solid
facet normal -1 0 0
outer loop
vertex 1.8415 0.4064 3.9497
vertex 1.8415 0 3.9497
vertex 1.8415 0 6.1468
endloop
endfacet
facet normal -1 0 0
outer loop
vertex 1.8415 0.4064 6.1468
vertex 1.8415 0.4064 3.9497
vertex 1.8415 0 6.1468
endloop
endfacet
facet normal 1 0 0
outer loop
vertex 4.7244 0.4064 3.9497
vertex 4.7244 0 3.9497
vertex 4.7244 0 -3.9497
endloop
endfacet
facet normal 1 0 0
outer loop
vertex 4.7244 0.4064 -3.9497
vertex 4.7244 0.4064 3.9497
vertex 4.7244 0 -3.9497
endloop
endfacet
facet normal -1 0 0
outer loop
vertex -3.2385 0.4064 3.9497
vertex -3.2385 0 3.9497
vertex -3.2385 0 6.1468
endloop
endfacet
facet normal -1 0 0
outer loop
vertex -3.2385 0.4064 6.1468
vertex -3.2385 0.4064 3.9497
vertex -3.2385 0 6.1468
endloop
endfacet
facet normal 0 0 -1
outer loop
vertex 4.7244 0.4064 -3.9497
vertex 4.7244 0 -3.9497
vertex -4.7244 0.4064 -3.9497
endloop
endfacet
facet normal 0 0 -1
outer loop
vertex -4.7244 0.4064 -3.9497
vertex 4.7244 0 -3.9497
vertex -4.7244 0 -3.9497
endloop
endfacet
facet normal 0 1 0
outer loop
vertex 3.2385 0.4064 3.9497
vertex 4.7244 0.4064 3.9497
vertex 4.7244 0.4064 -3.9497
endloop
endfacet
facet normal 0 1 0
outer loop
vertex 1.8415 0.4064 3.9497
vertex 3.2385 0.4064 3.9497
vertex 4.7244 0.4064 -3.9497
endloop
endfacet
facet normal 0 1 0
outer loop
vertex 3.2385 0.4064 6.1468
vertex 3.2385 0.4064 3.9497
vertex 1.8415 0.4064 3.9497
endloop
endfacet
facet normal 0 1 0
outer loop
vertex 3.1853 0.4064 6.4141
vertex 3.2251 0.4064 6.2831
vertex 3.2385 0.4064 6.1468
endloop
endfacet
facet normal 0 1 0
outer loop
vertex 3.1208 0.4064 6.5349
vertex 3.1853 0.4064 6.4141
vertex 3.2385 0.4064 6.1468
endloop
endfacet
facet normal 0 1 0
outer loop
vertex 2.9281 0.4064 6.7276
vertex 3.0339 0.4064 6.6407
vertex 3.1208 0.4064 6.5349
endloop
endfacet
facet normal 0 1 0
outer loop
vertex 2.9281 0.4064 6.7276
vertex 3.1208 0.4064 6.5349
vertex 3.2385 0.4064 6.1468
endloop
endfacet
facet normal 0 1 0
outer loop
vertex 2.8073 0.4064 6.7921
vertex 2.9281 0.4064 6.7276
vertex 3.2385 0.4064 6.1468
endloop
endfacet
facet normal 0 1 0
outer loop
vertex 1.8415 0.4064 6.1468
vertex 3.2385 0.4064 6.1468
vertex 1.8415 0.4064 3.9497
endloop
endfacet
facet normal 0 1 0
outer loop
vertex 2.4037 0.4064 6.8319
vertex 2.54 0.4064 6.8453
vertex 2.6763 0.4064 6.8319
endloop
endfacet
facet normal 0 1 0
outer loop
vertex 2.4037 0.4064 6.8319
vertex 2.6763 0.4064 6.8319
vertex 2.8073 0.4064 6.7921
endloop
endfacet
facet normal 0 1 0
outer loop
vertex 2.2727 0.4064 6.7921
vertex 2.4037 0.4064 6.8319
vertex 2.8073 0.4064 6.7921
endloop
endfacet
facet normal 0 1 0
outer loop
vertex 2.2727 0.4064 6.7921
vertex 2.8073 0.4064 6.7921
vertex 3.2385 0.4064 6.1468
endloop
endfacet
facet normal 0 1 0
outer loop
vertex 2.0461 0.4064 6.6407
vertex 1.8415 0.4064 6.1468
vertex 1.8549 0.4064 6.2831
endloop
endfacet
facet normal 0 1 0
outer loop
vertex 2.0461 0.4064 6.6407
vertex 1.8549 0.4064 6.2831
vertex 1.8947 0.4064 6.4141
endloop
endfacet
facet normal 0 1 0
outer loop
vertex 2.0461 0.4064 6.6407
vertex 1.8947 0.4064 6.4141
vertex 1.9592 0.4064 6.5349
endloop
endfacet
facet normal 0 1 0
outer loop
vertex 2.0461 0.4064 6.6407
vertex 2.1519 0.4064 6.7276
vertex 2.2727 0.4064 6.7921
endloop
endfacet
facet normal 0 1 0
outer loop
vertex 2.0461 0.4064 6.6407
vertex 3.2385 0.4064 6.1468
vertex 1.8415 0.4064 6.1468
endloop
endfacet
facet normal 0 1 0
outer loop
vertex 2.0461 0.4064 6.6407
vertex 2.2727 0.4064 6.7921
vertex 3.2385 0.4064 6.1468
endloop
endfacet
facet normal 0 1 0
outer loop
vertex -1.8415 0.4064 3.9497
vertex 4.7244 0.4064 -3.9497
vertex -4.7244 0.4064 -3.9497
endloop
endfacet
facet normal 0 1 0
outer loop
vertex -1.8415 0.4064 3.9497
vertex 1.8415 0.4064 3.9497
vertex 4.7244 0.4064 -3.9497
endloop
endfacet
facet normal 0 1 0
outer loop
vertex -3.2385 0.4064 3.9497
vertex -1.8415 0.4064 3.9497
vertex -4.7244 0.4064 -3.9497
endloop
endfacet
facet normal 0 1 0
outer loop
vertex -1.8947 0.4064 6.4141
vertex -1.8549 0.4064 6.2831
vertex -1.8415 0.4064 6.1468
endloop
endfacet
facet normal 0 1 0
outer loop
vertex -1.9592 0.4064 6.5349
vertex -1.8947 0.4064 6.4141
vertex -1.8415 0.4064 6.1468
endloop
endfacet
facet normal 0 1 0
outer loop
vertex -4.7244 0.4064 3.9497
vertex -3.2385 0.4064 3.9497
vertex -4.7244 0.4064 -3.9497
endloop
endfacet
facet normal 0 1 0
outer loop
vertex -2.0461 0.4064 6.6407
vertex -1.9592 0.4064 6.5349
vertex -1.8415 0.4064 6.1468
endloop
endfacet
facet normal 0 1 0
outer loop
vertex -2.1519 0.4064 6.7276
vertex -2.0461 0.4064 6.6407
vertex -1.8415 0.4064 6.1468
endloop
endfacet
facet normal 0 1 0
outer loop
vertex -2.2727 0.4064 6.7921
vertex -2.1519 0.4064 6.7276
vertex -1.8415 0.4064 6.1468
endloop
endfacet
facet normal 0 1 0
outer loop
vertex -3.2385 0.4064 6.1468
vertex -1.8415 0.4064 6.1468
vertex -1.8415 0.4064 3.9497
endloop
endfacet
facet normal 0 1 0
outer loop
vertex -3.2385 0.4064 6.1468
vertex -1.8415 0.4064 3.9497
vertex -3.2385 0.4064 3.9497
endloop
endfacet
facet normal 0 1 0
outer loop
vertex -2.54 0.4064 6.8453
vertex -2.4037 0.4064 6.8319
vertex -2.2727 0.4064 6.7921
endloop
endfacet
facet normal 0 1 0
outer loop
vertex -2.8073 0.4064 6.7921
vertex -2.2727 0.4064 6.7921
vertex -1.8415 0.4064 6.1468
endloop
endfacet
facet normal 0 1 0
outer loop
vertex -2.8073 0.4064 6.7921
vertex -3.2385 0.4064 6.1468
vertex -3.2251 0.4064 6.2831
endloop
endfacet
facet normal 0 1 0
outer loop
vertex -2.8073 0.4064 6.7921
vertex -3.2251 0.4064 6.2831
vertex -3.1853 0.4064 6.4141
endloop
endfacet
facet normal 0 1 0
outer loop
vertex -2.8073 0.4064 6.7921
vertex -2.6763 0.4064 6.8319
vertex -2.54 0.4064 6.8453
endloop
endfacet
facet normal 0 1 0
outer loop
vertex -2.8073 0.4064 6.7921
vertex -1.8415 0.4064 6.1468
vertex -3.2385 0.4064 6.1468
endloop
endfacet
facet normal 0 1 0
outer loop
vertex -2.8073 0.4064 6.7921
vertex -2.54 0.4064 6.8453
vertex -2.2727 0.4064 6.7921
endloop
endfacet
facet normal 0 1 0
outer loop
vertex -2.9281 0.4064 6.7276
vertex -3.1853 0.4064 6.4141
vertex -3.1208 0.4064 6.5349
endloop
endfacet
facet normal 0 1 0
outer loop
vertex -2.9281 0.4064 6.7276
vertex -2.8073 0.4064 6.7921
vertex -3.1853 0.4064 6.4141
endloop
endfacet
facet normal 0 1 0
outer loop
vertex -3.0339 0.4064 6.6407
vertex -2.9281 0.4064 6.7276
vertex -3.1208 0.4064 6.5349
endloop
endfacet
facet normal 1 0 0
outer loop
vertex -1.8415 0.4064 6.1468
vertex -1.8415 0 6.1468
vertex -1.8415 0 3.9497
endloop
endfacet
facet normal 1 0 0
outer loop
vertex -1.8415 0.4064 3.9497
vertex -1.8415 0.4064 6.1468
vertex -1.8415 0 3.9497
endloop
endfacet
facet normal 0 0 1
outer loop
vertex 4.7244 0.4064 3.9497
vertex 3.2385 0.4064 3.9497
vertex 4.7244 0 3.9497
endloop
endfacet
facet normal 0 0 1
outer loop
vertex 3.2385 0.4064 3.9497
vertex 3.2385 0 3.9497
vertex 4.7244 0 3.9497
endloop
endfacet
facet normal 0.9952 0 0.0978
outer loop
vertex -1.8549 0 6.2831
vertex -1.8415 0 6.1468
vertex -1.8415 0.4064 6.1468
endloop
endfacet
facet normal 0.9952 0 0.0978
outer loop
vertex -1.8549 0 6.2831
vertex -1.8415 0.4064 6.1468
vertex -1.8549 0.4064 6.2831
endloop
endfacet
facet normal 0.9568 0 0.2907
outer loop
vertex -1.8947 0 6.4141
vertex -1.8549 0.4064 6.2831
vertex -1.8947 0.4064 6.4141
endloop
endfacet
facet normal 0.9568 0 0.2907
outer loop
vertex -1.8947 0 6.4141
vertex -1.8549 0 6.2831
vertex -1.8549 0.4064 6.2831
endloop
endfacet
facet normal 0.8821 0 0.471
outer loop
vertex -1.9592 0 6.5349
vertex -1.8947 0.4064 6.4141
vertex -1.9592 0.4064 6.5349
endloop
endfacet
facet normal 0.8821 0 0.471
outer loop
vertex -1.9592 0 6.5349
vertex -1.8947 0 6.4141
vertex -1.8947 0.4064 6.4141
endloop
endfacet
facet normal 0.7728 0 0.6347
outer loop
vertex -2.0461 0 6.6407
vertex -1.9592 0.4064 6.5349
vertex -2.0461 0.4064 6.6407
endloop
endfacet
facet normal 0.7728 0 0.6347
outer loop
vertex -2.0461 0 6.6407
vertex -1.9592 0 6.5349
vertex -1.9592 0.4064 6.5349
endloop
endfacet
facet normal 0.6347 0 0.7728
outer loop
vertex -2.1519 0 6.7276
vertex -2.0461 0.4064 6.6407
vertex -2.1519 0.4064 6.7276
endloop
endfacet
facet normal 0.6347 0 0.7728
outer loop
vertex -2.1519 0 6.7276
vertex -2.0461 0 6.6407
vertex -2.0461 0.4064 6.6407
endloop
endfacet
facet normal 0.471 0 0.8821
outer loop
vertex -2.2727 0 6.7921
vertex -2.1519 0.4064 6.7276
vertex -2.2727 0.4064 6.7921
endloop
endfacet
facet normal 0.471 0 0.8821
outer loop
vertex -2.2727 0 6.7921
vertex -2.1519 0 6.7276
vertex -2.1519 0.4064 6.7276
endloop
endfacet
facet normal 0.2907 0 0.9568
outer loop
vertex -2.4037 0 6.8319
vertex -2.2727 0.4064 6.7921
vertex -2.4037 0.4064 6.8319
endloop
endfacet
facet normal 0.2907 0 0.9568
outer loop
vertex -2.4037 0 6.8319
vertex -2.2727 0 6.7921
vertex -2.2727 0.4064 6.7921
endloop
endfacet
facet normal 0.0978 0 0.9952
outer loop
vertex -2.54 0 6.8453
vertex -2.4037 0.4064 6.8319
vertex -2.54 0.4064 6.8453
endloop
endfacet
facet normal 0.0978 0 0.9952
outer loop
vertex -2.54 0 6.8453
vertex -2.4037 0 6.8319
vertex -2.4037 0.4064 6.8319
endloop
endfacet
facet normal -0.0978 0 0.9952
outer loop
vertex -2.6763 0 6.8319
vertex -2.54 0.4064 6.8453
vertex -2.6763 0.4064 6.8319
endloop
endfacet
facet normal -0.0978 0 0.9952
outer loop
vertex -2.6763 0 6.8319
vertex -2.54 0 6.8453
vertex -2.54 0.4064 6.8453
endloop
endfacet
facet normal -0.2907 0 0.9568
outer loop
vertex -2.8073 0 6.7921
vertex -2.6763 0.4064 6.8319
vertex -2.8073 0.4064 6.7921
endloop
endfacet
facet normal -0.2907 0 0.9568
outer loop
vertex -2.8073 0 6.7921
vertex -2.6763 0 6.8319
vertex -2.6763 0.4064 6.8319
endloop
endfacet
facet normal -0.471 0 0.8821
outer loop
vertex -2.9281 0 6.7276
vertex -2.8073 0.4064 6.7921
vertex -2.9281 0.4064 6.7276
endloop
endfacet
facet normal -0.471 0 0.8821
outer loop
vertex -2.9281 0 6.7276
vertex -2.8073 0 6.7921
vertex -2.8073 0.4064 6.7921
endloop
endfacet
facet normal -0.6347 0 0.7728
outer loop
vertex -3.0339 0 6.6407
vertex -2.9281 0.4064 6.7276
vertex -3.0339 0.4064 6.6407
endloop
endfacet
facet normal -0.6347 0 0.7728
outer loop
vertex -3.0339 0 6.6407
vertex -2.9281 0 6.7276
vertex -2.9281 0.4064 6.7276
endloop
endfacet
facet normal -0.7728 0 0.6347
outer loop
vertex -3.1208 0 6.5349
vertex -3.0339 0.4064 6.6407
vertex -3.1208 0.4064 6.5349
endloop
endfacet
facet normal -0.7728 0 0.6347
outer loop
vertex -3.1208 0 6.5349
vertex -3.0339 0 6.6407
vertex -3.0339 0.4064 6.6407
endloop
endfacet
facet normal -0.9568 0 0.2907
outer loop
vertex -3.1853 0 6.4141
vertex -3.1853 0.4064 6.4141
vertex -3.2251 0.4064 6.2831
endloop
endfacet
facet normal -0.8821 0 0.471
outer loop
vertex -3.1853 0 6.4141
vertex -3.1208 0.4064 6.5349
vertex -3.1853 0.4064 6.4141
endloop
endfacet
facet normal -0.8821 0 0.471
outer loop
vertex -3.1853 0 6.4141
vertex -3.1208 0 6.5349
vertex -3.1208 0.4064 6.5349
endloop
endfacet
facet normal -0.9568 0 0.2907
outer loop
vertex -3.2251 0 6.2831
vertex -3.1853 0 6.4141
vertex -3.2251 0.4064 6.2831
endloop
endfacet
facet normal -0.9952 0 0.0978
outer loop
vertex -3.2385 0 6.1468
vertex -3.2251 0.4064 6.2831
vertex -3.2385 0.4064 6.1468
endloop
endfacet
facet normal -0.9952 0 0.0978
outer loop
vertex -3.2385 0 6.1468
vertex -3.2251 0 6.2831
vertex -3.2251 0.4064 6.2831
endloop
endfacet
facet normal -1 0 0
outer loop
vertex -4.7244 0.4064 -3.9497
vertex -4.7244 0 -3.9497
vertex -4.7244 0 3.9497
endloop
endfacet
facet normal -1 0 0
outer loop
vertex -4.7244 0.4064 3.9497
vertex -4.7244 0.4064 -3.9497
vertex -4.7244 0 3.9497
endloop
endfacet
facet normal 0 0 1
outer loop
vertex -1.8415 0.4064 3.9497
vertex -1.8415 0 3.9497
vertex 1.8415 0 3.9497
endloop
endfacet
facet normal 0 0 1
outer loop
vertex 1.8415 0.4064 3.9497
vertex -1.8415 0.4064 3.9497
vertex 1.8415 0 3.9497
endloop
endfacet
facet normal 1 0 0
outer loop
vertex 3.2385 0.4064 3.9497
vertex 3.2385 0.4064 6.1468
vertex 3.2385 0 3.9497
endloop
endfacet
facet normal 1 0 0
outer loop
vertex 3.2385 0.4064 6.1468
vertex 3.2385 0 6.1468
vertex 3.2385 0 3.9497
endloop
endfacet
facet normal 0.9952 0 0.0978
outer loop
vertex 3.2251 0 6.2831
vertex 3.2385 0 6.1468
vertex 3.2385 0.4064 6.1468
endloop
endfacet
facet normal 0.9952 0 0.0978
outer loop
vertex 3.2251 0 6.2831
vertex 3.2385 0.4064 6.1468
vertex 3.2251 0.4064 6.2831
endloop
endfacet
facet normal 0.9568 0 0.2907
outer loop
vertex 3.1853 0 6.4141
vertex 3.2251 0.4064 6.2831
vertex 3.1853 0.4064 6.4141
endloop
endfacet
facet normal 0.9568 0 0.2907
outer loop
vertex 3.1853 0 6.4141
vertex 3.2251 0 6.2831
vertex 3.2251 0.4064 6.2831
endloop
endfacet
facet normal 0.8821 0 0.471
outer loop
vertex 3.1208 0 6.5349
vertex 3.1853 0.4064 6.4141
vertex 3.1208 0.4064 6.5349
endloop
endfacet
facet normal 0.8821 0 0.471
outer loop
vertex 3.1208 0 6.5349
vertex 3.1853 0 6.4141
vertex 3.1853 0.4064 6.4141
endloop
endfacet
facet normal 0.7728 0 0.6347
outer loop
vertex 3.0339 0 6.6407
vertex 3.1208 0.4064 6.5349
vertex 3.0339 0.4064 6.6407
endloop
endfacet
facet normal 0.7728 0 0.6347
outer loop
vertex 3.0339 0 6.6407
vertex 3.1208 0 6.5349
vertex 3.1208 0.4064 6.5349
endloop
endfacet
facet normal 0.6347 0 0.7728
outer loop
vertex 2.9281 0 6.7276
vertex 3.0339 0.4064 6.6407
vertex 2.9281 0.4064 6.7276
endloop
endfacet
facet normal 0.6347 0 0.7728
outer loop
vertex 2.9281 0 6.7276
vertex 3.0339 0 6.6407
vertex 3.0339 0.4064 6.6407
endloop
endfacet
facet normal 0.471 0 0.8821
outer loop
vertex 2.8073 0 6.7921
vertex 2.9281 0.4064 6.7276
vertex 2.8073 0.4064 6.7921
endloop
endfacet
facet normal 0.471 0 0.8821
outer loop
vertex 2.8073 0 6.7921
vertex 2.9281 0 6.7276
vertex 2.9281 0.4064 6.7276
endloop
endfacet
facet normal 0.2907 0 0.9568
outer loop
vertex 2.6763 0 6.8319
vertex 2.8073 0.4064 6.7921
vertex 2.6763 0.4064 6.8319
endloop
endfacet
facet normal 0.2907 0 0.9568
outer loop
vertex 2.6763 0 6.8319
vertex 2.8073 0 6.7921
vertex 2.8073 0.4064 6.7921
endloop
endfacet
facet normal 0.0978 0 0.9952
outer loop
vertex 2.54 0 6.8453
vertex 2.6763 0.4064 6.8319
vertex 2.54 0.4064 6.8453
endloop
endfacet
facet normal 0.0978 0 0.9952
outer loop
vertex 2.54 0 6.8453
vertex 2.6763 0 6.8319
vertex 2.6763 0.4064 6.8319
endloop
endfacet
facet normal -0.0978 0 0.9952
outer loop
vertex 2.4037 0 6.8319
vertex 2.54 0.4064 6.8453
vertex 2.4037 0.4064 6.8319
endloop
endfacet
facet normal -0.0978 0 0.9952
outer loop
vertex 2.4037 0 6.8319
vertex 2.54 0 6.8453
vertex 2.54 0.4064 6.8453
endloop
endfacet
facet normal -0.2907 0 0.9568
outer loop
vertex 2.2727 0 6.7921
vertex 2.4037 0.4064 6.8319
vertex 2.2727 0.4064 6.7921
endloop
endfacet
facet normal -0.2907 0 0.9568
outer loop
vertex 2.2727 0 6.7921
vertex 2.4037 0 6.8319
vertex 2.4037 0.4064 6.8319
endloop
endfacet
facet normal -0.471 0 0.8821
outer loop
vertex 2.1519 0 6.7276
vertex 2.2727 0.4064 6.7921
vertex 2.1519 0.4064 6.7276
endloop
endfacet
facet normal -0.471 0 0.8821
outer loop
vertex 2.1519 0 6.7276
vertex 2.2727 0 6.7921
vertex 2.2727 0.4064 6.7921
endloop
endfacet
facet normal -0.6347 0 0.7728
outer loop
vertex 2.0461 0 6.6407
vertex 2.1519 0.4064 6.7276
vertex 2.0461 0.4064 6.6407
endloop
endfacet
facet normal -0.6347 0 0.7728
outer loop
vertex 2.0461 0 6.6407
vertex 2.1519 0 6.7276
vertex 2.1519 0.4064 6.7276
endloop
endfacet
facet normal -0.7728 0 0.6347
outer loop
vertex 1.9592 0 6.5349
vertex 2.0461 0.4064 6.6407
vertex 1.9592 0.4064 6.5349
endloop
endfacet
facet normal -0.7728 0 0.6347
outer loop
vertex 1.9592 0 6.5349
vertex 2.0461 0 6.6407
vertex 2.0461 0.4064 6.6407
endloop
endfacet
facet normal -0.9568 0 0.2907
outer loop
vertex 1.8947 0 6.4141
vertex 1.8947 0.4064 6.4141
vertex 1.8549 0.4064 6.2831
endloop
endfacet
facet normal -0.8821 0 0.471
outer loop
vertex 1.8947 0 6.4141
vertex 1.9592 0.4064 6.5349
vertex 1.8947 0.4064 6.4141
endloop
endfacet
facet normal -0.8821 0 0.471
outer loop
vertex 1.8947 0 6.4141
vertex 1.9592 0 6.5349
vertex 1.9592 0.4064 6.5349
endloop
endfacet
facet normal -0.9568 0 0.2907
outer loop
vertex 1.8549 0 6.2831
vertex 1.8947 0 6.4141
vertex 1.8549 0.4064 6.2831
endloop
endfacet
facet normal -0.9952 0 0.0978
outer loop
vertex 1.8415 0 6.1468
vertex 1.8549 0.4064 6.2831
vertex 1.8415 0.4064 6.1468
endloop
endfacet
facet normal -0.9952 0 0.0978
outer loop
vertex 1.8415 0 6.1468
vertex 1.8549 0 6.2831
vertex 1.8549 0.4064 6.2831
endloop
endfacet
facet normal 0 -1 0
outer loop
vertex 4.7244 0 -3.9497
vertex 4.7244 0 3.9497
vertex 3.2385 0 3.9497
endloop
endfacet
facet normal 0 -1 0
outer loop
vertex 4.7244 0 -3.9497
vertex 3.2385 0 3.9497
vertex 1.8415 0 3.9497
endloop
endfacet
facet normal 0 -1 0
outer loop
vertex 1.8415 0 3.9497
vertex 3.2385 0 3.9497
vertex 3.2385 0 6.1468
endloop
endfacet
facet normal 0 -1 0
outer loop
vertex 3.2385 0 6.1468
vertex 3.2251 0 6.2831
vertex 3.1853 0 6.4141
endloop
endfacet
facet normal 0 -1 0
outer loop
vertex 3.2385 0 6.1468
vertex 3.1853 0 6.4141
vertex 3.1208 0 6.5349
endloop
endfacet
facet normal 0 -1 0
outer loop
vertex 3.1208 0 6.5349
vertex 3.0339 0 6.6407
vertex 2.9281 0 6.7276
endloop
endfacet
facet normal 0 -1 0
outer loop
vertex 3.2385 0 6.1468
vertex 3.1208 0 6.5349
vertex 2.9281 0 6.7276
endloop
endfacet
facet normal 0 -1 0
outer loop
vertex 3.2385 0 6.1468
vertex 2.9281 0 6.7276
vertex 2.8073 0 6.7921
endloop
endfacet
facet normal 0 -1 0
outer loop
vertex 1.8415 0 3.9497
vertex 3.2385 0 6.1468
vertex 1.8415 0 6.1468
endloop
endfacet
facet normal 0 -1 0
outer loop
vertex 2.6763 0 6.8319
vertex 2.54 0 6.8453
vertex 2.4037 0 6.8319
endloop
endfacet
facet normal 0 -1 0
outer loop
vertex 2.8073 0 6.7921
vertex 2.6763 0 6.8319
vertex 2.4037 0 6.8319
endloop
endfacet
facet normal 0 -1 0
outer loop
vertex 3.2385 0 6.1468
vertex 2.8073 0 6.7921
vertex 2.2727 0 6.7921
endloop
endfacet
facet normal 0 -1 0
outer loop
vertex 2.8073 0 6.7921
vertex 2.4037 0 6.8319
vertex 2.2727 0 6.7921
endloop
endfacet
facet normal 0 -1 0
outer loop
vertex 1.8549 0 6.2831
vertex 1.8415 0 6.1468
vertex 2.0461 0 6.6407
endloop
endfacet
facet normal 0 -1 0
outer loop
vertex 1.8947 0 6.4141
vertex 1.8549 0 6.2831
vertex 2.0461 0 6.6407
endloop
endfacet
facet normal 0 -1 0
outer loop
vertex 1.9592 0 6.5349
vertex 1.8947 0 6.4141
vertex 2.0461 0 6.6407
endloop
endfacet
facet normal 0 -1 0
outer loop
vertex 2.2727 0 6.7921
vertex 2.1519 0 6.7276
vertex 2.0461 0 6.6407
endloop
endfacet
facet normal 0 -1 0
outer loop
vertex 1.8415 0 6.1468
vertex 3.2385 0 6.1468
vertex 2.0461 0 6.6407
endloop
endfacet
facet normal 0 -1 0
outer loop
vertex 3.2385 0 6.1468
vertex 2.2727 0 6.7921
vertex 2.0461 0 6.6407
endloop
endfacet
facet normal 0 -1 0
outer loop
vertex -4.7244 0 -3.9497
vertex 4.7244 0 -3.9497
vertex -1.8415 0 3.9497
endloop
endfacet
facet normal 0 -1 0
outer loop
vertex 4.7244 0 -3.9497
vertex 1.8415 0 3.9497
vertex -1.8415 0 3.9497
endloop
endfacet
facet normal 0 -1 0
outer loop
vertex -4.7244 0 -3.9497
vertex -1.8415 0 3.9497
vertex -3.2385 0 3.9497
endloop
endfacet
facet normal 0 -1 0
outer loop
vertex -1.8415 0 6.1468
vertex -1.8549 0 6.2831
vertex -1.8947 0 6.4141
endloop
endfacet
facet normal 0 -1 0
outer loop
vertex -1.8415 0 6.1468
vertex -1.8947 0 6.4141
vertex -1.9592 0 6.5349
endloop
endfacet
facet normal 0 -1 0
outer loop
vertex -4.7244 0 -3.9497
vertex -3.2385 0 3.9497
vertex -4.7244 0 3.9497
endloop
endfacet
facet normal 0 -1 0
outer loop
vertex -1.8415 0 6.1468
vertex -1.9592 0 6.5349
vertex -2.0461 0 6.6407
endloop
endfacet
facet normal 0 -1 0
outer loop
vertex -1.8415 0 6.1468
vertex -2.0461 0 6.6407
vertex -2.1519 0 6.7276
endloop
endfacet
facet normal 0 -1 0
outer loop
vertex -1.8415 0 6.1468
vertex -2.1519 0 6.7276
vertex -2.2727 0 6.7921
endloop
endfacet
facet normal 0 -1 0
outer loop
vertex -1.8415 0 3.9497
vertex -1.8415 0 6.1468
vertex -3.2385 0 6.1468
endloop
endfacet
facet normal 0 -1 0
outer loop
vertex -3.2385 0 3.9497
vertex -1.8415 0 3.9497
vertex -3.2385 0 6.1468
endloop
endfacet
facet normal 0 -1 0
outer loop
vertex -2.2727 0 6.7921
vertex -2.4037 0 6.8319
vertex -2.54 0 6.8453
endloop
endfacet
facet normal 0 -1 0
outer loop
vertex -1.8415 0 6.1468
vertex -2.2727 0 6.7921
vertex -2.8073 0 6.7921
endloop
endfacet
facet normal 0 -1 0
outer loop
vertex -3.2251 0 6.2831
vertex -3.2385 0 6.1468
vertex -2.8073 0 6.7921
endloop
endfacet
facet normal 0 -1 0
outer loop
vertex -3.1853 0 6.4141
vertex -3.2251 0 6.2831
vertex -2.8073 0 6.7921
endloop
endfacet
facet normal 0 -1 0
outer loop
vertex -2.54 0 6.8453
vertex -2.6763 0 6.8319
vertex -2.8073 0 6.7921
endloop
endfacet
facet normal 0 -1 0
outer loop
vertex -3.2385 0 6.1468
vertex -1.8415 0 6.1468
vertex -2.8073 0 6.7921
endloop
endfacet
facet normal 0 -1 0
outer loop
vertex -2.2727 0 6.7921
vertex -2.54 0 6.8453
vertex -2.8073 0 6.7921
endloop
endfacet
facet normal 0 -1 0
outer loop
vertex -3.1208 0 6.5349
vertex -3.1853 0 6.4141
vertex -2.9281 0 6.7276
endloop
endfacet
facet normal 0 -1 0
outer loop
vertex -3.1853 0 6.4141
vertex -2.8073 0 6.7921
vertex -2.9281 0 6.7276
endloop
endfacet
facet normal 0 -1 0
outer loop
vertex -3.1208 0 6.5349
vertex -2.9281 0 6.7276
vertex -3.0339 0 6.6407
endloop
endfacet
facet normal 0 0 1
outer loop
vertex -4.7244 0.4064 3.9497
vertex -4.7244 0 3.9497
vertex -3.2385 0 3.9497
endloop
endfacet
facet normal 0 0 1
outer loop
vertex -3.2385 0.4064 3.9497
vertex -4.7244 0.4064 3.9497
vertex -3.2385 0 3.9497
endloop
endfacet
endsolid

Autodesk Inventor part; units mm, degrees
sketch "Sketch_1" plane through (0, 0, 0) normal (0, 1, 0) x (-1, 0, 0)
  line L0 (4.7244, 3.9497) -> (3.2385, 3.9497)
  line L1 (3.2385, 3.9497) -> (3.2385, 6.1468)
  arc A0 (3.2385, 6.1468) -> (1.8415, 6.1468) centre (2.54, 6.1468) ccw
  line L2 (1.8415, 6.1468) -> (1.8415, 3.9497)
  line L3 (1.8415, 3.9497) -> (-1.8415, 3.9497)
  line L4 (-1.8415, 3.9497) -> (-1.8415, 6.1468)
  arc A1 (-1.8415, 6.1468) -> (-3.2385, 6.1468) centre (-2.54, 6.1468) ccw
  line L5 (-3.2385, 6.1468) -> (-3.2385, 3.9497)
  line L6 (-3.2385, 3.9497) -> (-4.7244, 3.9497)
  line L7 (-4.7244, 3.9497) -> (-4.7244, -3.9497)
  line L8 (-4.7244, -3.9497) -> (4.7244, -3.9497)
  line L9 (4.7244, -3.9497) -> (4.7244, 3.9497)
extrude "Extrusion1" add sketch "Sketch_1" along normal blind 0.4064
ref_plane "shtrmnl_XY" through (0, 0, 0) normal (0, 1, 0) x (1, 0, 0)
ref_plane "shtrmnl_YZ" through (0, 0, 0) normal (1, 0, 0) x (0, 0, -1)
ref_plane "shtrmnl_ZX" through (0, 0, 0) normal (0, 0, -1) x (0, 1, 0)
properties part number "M201230TX-switch"
